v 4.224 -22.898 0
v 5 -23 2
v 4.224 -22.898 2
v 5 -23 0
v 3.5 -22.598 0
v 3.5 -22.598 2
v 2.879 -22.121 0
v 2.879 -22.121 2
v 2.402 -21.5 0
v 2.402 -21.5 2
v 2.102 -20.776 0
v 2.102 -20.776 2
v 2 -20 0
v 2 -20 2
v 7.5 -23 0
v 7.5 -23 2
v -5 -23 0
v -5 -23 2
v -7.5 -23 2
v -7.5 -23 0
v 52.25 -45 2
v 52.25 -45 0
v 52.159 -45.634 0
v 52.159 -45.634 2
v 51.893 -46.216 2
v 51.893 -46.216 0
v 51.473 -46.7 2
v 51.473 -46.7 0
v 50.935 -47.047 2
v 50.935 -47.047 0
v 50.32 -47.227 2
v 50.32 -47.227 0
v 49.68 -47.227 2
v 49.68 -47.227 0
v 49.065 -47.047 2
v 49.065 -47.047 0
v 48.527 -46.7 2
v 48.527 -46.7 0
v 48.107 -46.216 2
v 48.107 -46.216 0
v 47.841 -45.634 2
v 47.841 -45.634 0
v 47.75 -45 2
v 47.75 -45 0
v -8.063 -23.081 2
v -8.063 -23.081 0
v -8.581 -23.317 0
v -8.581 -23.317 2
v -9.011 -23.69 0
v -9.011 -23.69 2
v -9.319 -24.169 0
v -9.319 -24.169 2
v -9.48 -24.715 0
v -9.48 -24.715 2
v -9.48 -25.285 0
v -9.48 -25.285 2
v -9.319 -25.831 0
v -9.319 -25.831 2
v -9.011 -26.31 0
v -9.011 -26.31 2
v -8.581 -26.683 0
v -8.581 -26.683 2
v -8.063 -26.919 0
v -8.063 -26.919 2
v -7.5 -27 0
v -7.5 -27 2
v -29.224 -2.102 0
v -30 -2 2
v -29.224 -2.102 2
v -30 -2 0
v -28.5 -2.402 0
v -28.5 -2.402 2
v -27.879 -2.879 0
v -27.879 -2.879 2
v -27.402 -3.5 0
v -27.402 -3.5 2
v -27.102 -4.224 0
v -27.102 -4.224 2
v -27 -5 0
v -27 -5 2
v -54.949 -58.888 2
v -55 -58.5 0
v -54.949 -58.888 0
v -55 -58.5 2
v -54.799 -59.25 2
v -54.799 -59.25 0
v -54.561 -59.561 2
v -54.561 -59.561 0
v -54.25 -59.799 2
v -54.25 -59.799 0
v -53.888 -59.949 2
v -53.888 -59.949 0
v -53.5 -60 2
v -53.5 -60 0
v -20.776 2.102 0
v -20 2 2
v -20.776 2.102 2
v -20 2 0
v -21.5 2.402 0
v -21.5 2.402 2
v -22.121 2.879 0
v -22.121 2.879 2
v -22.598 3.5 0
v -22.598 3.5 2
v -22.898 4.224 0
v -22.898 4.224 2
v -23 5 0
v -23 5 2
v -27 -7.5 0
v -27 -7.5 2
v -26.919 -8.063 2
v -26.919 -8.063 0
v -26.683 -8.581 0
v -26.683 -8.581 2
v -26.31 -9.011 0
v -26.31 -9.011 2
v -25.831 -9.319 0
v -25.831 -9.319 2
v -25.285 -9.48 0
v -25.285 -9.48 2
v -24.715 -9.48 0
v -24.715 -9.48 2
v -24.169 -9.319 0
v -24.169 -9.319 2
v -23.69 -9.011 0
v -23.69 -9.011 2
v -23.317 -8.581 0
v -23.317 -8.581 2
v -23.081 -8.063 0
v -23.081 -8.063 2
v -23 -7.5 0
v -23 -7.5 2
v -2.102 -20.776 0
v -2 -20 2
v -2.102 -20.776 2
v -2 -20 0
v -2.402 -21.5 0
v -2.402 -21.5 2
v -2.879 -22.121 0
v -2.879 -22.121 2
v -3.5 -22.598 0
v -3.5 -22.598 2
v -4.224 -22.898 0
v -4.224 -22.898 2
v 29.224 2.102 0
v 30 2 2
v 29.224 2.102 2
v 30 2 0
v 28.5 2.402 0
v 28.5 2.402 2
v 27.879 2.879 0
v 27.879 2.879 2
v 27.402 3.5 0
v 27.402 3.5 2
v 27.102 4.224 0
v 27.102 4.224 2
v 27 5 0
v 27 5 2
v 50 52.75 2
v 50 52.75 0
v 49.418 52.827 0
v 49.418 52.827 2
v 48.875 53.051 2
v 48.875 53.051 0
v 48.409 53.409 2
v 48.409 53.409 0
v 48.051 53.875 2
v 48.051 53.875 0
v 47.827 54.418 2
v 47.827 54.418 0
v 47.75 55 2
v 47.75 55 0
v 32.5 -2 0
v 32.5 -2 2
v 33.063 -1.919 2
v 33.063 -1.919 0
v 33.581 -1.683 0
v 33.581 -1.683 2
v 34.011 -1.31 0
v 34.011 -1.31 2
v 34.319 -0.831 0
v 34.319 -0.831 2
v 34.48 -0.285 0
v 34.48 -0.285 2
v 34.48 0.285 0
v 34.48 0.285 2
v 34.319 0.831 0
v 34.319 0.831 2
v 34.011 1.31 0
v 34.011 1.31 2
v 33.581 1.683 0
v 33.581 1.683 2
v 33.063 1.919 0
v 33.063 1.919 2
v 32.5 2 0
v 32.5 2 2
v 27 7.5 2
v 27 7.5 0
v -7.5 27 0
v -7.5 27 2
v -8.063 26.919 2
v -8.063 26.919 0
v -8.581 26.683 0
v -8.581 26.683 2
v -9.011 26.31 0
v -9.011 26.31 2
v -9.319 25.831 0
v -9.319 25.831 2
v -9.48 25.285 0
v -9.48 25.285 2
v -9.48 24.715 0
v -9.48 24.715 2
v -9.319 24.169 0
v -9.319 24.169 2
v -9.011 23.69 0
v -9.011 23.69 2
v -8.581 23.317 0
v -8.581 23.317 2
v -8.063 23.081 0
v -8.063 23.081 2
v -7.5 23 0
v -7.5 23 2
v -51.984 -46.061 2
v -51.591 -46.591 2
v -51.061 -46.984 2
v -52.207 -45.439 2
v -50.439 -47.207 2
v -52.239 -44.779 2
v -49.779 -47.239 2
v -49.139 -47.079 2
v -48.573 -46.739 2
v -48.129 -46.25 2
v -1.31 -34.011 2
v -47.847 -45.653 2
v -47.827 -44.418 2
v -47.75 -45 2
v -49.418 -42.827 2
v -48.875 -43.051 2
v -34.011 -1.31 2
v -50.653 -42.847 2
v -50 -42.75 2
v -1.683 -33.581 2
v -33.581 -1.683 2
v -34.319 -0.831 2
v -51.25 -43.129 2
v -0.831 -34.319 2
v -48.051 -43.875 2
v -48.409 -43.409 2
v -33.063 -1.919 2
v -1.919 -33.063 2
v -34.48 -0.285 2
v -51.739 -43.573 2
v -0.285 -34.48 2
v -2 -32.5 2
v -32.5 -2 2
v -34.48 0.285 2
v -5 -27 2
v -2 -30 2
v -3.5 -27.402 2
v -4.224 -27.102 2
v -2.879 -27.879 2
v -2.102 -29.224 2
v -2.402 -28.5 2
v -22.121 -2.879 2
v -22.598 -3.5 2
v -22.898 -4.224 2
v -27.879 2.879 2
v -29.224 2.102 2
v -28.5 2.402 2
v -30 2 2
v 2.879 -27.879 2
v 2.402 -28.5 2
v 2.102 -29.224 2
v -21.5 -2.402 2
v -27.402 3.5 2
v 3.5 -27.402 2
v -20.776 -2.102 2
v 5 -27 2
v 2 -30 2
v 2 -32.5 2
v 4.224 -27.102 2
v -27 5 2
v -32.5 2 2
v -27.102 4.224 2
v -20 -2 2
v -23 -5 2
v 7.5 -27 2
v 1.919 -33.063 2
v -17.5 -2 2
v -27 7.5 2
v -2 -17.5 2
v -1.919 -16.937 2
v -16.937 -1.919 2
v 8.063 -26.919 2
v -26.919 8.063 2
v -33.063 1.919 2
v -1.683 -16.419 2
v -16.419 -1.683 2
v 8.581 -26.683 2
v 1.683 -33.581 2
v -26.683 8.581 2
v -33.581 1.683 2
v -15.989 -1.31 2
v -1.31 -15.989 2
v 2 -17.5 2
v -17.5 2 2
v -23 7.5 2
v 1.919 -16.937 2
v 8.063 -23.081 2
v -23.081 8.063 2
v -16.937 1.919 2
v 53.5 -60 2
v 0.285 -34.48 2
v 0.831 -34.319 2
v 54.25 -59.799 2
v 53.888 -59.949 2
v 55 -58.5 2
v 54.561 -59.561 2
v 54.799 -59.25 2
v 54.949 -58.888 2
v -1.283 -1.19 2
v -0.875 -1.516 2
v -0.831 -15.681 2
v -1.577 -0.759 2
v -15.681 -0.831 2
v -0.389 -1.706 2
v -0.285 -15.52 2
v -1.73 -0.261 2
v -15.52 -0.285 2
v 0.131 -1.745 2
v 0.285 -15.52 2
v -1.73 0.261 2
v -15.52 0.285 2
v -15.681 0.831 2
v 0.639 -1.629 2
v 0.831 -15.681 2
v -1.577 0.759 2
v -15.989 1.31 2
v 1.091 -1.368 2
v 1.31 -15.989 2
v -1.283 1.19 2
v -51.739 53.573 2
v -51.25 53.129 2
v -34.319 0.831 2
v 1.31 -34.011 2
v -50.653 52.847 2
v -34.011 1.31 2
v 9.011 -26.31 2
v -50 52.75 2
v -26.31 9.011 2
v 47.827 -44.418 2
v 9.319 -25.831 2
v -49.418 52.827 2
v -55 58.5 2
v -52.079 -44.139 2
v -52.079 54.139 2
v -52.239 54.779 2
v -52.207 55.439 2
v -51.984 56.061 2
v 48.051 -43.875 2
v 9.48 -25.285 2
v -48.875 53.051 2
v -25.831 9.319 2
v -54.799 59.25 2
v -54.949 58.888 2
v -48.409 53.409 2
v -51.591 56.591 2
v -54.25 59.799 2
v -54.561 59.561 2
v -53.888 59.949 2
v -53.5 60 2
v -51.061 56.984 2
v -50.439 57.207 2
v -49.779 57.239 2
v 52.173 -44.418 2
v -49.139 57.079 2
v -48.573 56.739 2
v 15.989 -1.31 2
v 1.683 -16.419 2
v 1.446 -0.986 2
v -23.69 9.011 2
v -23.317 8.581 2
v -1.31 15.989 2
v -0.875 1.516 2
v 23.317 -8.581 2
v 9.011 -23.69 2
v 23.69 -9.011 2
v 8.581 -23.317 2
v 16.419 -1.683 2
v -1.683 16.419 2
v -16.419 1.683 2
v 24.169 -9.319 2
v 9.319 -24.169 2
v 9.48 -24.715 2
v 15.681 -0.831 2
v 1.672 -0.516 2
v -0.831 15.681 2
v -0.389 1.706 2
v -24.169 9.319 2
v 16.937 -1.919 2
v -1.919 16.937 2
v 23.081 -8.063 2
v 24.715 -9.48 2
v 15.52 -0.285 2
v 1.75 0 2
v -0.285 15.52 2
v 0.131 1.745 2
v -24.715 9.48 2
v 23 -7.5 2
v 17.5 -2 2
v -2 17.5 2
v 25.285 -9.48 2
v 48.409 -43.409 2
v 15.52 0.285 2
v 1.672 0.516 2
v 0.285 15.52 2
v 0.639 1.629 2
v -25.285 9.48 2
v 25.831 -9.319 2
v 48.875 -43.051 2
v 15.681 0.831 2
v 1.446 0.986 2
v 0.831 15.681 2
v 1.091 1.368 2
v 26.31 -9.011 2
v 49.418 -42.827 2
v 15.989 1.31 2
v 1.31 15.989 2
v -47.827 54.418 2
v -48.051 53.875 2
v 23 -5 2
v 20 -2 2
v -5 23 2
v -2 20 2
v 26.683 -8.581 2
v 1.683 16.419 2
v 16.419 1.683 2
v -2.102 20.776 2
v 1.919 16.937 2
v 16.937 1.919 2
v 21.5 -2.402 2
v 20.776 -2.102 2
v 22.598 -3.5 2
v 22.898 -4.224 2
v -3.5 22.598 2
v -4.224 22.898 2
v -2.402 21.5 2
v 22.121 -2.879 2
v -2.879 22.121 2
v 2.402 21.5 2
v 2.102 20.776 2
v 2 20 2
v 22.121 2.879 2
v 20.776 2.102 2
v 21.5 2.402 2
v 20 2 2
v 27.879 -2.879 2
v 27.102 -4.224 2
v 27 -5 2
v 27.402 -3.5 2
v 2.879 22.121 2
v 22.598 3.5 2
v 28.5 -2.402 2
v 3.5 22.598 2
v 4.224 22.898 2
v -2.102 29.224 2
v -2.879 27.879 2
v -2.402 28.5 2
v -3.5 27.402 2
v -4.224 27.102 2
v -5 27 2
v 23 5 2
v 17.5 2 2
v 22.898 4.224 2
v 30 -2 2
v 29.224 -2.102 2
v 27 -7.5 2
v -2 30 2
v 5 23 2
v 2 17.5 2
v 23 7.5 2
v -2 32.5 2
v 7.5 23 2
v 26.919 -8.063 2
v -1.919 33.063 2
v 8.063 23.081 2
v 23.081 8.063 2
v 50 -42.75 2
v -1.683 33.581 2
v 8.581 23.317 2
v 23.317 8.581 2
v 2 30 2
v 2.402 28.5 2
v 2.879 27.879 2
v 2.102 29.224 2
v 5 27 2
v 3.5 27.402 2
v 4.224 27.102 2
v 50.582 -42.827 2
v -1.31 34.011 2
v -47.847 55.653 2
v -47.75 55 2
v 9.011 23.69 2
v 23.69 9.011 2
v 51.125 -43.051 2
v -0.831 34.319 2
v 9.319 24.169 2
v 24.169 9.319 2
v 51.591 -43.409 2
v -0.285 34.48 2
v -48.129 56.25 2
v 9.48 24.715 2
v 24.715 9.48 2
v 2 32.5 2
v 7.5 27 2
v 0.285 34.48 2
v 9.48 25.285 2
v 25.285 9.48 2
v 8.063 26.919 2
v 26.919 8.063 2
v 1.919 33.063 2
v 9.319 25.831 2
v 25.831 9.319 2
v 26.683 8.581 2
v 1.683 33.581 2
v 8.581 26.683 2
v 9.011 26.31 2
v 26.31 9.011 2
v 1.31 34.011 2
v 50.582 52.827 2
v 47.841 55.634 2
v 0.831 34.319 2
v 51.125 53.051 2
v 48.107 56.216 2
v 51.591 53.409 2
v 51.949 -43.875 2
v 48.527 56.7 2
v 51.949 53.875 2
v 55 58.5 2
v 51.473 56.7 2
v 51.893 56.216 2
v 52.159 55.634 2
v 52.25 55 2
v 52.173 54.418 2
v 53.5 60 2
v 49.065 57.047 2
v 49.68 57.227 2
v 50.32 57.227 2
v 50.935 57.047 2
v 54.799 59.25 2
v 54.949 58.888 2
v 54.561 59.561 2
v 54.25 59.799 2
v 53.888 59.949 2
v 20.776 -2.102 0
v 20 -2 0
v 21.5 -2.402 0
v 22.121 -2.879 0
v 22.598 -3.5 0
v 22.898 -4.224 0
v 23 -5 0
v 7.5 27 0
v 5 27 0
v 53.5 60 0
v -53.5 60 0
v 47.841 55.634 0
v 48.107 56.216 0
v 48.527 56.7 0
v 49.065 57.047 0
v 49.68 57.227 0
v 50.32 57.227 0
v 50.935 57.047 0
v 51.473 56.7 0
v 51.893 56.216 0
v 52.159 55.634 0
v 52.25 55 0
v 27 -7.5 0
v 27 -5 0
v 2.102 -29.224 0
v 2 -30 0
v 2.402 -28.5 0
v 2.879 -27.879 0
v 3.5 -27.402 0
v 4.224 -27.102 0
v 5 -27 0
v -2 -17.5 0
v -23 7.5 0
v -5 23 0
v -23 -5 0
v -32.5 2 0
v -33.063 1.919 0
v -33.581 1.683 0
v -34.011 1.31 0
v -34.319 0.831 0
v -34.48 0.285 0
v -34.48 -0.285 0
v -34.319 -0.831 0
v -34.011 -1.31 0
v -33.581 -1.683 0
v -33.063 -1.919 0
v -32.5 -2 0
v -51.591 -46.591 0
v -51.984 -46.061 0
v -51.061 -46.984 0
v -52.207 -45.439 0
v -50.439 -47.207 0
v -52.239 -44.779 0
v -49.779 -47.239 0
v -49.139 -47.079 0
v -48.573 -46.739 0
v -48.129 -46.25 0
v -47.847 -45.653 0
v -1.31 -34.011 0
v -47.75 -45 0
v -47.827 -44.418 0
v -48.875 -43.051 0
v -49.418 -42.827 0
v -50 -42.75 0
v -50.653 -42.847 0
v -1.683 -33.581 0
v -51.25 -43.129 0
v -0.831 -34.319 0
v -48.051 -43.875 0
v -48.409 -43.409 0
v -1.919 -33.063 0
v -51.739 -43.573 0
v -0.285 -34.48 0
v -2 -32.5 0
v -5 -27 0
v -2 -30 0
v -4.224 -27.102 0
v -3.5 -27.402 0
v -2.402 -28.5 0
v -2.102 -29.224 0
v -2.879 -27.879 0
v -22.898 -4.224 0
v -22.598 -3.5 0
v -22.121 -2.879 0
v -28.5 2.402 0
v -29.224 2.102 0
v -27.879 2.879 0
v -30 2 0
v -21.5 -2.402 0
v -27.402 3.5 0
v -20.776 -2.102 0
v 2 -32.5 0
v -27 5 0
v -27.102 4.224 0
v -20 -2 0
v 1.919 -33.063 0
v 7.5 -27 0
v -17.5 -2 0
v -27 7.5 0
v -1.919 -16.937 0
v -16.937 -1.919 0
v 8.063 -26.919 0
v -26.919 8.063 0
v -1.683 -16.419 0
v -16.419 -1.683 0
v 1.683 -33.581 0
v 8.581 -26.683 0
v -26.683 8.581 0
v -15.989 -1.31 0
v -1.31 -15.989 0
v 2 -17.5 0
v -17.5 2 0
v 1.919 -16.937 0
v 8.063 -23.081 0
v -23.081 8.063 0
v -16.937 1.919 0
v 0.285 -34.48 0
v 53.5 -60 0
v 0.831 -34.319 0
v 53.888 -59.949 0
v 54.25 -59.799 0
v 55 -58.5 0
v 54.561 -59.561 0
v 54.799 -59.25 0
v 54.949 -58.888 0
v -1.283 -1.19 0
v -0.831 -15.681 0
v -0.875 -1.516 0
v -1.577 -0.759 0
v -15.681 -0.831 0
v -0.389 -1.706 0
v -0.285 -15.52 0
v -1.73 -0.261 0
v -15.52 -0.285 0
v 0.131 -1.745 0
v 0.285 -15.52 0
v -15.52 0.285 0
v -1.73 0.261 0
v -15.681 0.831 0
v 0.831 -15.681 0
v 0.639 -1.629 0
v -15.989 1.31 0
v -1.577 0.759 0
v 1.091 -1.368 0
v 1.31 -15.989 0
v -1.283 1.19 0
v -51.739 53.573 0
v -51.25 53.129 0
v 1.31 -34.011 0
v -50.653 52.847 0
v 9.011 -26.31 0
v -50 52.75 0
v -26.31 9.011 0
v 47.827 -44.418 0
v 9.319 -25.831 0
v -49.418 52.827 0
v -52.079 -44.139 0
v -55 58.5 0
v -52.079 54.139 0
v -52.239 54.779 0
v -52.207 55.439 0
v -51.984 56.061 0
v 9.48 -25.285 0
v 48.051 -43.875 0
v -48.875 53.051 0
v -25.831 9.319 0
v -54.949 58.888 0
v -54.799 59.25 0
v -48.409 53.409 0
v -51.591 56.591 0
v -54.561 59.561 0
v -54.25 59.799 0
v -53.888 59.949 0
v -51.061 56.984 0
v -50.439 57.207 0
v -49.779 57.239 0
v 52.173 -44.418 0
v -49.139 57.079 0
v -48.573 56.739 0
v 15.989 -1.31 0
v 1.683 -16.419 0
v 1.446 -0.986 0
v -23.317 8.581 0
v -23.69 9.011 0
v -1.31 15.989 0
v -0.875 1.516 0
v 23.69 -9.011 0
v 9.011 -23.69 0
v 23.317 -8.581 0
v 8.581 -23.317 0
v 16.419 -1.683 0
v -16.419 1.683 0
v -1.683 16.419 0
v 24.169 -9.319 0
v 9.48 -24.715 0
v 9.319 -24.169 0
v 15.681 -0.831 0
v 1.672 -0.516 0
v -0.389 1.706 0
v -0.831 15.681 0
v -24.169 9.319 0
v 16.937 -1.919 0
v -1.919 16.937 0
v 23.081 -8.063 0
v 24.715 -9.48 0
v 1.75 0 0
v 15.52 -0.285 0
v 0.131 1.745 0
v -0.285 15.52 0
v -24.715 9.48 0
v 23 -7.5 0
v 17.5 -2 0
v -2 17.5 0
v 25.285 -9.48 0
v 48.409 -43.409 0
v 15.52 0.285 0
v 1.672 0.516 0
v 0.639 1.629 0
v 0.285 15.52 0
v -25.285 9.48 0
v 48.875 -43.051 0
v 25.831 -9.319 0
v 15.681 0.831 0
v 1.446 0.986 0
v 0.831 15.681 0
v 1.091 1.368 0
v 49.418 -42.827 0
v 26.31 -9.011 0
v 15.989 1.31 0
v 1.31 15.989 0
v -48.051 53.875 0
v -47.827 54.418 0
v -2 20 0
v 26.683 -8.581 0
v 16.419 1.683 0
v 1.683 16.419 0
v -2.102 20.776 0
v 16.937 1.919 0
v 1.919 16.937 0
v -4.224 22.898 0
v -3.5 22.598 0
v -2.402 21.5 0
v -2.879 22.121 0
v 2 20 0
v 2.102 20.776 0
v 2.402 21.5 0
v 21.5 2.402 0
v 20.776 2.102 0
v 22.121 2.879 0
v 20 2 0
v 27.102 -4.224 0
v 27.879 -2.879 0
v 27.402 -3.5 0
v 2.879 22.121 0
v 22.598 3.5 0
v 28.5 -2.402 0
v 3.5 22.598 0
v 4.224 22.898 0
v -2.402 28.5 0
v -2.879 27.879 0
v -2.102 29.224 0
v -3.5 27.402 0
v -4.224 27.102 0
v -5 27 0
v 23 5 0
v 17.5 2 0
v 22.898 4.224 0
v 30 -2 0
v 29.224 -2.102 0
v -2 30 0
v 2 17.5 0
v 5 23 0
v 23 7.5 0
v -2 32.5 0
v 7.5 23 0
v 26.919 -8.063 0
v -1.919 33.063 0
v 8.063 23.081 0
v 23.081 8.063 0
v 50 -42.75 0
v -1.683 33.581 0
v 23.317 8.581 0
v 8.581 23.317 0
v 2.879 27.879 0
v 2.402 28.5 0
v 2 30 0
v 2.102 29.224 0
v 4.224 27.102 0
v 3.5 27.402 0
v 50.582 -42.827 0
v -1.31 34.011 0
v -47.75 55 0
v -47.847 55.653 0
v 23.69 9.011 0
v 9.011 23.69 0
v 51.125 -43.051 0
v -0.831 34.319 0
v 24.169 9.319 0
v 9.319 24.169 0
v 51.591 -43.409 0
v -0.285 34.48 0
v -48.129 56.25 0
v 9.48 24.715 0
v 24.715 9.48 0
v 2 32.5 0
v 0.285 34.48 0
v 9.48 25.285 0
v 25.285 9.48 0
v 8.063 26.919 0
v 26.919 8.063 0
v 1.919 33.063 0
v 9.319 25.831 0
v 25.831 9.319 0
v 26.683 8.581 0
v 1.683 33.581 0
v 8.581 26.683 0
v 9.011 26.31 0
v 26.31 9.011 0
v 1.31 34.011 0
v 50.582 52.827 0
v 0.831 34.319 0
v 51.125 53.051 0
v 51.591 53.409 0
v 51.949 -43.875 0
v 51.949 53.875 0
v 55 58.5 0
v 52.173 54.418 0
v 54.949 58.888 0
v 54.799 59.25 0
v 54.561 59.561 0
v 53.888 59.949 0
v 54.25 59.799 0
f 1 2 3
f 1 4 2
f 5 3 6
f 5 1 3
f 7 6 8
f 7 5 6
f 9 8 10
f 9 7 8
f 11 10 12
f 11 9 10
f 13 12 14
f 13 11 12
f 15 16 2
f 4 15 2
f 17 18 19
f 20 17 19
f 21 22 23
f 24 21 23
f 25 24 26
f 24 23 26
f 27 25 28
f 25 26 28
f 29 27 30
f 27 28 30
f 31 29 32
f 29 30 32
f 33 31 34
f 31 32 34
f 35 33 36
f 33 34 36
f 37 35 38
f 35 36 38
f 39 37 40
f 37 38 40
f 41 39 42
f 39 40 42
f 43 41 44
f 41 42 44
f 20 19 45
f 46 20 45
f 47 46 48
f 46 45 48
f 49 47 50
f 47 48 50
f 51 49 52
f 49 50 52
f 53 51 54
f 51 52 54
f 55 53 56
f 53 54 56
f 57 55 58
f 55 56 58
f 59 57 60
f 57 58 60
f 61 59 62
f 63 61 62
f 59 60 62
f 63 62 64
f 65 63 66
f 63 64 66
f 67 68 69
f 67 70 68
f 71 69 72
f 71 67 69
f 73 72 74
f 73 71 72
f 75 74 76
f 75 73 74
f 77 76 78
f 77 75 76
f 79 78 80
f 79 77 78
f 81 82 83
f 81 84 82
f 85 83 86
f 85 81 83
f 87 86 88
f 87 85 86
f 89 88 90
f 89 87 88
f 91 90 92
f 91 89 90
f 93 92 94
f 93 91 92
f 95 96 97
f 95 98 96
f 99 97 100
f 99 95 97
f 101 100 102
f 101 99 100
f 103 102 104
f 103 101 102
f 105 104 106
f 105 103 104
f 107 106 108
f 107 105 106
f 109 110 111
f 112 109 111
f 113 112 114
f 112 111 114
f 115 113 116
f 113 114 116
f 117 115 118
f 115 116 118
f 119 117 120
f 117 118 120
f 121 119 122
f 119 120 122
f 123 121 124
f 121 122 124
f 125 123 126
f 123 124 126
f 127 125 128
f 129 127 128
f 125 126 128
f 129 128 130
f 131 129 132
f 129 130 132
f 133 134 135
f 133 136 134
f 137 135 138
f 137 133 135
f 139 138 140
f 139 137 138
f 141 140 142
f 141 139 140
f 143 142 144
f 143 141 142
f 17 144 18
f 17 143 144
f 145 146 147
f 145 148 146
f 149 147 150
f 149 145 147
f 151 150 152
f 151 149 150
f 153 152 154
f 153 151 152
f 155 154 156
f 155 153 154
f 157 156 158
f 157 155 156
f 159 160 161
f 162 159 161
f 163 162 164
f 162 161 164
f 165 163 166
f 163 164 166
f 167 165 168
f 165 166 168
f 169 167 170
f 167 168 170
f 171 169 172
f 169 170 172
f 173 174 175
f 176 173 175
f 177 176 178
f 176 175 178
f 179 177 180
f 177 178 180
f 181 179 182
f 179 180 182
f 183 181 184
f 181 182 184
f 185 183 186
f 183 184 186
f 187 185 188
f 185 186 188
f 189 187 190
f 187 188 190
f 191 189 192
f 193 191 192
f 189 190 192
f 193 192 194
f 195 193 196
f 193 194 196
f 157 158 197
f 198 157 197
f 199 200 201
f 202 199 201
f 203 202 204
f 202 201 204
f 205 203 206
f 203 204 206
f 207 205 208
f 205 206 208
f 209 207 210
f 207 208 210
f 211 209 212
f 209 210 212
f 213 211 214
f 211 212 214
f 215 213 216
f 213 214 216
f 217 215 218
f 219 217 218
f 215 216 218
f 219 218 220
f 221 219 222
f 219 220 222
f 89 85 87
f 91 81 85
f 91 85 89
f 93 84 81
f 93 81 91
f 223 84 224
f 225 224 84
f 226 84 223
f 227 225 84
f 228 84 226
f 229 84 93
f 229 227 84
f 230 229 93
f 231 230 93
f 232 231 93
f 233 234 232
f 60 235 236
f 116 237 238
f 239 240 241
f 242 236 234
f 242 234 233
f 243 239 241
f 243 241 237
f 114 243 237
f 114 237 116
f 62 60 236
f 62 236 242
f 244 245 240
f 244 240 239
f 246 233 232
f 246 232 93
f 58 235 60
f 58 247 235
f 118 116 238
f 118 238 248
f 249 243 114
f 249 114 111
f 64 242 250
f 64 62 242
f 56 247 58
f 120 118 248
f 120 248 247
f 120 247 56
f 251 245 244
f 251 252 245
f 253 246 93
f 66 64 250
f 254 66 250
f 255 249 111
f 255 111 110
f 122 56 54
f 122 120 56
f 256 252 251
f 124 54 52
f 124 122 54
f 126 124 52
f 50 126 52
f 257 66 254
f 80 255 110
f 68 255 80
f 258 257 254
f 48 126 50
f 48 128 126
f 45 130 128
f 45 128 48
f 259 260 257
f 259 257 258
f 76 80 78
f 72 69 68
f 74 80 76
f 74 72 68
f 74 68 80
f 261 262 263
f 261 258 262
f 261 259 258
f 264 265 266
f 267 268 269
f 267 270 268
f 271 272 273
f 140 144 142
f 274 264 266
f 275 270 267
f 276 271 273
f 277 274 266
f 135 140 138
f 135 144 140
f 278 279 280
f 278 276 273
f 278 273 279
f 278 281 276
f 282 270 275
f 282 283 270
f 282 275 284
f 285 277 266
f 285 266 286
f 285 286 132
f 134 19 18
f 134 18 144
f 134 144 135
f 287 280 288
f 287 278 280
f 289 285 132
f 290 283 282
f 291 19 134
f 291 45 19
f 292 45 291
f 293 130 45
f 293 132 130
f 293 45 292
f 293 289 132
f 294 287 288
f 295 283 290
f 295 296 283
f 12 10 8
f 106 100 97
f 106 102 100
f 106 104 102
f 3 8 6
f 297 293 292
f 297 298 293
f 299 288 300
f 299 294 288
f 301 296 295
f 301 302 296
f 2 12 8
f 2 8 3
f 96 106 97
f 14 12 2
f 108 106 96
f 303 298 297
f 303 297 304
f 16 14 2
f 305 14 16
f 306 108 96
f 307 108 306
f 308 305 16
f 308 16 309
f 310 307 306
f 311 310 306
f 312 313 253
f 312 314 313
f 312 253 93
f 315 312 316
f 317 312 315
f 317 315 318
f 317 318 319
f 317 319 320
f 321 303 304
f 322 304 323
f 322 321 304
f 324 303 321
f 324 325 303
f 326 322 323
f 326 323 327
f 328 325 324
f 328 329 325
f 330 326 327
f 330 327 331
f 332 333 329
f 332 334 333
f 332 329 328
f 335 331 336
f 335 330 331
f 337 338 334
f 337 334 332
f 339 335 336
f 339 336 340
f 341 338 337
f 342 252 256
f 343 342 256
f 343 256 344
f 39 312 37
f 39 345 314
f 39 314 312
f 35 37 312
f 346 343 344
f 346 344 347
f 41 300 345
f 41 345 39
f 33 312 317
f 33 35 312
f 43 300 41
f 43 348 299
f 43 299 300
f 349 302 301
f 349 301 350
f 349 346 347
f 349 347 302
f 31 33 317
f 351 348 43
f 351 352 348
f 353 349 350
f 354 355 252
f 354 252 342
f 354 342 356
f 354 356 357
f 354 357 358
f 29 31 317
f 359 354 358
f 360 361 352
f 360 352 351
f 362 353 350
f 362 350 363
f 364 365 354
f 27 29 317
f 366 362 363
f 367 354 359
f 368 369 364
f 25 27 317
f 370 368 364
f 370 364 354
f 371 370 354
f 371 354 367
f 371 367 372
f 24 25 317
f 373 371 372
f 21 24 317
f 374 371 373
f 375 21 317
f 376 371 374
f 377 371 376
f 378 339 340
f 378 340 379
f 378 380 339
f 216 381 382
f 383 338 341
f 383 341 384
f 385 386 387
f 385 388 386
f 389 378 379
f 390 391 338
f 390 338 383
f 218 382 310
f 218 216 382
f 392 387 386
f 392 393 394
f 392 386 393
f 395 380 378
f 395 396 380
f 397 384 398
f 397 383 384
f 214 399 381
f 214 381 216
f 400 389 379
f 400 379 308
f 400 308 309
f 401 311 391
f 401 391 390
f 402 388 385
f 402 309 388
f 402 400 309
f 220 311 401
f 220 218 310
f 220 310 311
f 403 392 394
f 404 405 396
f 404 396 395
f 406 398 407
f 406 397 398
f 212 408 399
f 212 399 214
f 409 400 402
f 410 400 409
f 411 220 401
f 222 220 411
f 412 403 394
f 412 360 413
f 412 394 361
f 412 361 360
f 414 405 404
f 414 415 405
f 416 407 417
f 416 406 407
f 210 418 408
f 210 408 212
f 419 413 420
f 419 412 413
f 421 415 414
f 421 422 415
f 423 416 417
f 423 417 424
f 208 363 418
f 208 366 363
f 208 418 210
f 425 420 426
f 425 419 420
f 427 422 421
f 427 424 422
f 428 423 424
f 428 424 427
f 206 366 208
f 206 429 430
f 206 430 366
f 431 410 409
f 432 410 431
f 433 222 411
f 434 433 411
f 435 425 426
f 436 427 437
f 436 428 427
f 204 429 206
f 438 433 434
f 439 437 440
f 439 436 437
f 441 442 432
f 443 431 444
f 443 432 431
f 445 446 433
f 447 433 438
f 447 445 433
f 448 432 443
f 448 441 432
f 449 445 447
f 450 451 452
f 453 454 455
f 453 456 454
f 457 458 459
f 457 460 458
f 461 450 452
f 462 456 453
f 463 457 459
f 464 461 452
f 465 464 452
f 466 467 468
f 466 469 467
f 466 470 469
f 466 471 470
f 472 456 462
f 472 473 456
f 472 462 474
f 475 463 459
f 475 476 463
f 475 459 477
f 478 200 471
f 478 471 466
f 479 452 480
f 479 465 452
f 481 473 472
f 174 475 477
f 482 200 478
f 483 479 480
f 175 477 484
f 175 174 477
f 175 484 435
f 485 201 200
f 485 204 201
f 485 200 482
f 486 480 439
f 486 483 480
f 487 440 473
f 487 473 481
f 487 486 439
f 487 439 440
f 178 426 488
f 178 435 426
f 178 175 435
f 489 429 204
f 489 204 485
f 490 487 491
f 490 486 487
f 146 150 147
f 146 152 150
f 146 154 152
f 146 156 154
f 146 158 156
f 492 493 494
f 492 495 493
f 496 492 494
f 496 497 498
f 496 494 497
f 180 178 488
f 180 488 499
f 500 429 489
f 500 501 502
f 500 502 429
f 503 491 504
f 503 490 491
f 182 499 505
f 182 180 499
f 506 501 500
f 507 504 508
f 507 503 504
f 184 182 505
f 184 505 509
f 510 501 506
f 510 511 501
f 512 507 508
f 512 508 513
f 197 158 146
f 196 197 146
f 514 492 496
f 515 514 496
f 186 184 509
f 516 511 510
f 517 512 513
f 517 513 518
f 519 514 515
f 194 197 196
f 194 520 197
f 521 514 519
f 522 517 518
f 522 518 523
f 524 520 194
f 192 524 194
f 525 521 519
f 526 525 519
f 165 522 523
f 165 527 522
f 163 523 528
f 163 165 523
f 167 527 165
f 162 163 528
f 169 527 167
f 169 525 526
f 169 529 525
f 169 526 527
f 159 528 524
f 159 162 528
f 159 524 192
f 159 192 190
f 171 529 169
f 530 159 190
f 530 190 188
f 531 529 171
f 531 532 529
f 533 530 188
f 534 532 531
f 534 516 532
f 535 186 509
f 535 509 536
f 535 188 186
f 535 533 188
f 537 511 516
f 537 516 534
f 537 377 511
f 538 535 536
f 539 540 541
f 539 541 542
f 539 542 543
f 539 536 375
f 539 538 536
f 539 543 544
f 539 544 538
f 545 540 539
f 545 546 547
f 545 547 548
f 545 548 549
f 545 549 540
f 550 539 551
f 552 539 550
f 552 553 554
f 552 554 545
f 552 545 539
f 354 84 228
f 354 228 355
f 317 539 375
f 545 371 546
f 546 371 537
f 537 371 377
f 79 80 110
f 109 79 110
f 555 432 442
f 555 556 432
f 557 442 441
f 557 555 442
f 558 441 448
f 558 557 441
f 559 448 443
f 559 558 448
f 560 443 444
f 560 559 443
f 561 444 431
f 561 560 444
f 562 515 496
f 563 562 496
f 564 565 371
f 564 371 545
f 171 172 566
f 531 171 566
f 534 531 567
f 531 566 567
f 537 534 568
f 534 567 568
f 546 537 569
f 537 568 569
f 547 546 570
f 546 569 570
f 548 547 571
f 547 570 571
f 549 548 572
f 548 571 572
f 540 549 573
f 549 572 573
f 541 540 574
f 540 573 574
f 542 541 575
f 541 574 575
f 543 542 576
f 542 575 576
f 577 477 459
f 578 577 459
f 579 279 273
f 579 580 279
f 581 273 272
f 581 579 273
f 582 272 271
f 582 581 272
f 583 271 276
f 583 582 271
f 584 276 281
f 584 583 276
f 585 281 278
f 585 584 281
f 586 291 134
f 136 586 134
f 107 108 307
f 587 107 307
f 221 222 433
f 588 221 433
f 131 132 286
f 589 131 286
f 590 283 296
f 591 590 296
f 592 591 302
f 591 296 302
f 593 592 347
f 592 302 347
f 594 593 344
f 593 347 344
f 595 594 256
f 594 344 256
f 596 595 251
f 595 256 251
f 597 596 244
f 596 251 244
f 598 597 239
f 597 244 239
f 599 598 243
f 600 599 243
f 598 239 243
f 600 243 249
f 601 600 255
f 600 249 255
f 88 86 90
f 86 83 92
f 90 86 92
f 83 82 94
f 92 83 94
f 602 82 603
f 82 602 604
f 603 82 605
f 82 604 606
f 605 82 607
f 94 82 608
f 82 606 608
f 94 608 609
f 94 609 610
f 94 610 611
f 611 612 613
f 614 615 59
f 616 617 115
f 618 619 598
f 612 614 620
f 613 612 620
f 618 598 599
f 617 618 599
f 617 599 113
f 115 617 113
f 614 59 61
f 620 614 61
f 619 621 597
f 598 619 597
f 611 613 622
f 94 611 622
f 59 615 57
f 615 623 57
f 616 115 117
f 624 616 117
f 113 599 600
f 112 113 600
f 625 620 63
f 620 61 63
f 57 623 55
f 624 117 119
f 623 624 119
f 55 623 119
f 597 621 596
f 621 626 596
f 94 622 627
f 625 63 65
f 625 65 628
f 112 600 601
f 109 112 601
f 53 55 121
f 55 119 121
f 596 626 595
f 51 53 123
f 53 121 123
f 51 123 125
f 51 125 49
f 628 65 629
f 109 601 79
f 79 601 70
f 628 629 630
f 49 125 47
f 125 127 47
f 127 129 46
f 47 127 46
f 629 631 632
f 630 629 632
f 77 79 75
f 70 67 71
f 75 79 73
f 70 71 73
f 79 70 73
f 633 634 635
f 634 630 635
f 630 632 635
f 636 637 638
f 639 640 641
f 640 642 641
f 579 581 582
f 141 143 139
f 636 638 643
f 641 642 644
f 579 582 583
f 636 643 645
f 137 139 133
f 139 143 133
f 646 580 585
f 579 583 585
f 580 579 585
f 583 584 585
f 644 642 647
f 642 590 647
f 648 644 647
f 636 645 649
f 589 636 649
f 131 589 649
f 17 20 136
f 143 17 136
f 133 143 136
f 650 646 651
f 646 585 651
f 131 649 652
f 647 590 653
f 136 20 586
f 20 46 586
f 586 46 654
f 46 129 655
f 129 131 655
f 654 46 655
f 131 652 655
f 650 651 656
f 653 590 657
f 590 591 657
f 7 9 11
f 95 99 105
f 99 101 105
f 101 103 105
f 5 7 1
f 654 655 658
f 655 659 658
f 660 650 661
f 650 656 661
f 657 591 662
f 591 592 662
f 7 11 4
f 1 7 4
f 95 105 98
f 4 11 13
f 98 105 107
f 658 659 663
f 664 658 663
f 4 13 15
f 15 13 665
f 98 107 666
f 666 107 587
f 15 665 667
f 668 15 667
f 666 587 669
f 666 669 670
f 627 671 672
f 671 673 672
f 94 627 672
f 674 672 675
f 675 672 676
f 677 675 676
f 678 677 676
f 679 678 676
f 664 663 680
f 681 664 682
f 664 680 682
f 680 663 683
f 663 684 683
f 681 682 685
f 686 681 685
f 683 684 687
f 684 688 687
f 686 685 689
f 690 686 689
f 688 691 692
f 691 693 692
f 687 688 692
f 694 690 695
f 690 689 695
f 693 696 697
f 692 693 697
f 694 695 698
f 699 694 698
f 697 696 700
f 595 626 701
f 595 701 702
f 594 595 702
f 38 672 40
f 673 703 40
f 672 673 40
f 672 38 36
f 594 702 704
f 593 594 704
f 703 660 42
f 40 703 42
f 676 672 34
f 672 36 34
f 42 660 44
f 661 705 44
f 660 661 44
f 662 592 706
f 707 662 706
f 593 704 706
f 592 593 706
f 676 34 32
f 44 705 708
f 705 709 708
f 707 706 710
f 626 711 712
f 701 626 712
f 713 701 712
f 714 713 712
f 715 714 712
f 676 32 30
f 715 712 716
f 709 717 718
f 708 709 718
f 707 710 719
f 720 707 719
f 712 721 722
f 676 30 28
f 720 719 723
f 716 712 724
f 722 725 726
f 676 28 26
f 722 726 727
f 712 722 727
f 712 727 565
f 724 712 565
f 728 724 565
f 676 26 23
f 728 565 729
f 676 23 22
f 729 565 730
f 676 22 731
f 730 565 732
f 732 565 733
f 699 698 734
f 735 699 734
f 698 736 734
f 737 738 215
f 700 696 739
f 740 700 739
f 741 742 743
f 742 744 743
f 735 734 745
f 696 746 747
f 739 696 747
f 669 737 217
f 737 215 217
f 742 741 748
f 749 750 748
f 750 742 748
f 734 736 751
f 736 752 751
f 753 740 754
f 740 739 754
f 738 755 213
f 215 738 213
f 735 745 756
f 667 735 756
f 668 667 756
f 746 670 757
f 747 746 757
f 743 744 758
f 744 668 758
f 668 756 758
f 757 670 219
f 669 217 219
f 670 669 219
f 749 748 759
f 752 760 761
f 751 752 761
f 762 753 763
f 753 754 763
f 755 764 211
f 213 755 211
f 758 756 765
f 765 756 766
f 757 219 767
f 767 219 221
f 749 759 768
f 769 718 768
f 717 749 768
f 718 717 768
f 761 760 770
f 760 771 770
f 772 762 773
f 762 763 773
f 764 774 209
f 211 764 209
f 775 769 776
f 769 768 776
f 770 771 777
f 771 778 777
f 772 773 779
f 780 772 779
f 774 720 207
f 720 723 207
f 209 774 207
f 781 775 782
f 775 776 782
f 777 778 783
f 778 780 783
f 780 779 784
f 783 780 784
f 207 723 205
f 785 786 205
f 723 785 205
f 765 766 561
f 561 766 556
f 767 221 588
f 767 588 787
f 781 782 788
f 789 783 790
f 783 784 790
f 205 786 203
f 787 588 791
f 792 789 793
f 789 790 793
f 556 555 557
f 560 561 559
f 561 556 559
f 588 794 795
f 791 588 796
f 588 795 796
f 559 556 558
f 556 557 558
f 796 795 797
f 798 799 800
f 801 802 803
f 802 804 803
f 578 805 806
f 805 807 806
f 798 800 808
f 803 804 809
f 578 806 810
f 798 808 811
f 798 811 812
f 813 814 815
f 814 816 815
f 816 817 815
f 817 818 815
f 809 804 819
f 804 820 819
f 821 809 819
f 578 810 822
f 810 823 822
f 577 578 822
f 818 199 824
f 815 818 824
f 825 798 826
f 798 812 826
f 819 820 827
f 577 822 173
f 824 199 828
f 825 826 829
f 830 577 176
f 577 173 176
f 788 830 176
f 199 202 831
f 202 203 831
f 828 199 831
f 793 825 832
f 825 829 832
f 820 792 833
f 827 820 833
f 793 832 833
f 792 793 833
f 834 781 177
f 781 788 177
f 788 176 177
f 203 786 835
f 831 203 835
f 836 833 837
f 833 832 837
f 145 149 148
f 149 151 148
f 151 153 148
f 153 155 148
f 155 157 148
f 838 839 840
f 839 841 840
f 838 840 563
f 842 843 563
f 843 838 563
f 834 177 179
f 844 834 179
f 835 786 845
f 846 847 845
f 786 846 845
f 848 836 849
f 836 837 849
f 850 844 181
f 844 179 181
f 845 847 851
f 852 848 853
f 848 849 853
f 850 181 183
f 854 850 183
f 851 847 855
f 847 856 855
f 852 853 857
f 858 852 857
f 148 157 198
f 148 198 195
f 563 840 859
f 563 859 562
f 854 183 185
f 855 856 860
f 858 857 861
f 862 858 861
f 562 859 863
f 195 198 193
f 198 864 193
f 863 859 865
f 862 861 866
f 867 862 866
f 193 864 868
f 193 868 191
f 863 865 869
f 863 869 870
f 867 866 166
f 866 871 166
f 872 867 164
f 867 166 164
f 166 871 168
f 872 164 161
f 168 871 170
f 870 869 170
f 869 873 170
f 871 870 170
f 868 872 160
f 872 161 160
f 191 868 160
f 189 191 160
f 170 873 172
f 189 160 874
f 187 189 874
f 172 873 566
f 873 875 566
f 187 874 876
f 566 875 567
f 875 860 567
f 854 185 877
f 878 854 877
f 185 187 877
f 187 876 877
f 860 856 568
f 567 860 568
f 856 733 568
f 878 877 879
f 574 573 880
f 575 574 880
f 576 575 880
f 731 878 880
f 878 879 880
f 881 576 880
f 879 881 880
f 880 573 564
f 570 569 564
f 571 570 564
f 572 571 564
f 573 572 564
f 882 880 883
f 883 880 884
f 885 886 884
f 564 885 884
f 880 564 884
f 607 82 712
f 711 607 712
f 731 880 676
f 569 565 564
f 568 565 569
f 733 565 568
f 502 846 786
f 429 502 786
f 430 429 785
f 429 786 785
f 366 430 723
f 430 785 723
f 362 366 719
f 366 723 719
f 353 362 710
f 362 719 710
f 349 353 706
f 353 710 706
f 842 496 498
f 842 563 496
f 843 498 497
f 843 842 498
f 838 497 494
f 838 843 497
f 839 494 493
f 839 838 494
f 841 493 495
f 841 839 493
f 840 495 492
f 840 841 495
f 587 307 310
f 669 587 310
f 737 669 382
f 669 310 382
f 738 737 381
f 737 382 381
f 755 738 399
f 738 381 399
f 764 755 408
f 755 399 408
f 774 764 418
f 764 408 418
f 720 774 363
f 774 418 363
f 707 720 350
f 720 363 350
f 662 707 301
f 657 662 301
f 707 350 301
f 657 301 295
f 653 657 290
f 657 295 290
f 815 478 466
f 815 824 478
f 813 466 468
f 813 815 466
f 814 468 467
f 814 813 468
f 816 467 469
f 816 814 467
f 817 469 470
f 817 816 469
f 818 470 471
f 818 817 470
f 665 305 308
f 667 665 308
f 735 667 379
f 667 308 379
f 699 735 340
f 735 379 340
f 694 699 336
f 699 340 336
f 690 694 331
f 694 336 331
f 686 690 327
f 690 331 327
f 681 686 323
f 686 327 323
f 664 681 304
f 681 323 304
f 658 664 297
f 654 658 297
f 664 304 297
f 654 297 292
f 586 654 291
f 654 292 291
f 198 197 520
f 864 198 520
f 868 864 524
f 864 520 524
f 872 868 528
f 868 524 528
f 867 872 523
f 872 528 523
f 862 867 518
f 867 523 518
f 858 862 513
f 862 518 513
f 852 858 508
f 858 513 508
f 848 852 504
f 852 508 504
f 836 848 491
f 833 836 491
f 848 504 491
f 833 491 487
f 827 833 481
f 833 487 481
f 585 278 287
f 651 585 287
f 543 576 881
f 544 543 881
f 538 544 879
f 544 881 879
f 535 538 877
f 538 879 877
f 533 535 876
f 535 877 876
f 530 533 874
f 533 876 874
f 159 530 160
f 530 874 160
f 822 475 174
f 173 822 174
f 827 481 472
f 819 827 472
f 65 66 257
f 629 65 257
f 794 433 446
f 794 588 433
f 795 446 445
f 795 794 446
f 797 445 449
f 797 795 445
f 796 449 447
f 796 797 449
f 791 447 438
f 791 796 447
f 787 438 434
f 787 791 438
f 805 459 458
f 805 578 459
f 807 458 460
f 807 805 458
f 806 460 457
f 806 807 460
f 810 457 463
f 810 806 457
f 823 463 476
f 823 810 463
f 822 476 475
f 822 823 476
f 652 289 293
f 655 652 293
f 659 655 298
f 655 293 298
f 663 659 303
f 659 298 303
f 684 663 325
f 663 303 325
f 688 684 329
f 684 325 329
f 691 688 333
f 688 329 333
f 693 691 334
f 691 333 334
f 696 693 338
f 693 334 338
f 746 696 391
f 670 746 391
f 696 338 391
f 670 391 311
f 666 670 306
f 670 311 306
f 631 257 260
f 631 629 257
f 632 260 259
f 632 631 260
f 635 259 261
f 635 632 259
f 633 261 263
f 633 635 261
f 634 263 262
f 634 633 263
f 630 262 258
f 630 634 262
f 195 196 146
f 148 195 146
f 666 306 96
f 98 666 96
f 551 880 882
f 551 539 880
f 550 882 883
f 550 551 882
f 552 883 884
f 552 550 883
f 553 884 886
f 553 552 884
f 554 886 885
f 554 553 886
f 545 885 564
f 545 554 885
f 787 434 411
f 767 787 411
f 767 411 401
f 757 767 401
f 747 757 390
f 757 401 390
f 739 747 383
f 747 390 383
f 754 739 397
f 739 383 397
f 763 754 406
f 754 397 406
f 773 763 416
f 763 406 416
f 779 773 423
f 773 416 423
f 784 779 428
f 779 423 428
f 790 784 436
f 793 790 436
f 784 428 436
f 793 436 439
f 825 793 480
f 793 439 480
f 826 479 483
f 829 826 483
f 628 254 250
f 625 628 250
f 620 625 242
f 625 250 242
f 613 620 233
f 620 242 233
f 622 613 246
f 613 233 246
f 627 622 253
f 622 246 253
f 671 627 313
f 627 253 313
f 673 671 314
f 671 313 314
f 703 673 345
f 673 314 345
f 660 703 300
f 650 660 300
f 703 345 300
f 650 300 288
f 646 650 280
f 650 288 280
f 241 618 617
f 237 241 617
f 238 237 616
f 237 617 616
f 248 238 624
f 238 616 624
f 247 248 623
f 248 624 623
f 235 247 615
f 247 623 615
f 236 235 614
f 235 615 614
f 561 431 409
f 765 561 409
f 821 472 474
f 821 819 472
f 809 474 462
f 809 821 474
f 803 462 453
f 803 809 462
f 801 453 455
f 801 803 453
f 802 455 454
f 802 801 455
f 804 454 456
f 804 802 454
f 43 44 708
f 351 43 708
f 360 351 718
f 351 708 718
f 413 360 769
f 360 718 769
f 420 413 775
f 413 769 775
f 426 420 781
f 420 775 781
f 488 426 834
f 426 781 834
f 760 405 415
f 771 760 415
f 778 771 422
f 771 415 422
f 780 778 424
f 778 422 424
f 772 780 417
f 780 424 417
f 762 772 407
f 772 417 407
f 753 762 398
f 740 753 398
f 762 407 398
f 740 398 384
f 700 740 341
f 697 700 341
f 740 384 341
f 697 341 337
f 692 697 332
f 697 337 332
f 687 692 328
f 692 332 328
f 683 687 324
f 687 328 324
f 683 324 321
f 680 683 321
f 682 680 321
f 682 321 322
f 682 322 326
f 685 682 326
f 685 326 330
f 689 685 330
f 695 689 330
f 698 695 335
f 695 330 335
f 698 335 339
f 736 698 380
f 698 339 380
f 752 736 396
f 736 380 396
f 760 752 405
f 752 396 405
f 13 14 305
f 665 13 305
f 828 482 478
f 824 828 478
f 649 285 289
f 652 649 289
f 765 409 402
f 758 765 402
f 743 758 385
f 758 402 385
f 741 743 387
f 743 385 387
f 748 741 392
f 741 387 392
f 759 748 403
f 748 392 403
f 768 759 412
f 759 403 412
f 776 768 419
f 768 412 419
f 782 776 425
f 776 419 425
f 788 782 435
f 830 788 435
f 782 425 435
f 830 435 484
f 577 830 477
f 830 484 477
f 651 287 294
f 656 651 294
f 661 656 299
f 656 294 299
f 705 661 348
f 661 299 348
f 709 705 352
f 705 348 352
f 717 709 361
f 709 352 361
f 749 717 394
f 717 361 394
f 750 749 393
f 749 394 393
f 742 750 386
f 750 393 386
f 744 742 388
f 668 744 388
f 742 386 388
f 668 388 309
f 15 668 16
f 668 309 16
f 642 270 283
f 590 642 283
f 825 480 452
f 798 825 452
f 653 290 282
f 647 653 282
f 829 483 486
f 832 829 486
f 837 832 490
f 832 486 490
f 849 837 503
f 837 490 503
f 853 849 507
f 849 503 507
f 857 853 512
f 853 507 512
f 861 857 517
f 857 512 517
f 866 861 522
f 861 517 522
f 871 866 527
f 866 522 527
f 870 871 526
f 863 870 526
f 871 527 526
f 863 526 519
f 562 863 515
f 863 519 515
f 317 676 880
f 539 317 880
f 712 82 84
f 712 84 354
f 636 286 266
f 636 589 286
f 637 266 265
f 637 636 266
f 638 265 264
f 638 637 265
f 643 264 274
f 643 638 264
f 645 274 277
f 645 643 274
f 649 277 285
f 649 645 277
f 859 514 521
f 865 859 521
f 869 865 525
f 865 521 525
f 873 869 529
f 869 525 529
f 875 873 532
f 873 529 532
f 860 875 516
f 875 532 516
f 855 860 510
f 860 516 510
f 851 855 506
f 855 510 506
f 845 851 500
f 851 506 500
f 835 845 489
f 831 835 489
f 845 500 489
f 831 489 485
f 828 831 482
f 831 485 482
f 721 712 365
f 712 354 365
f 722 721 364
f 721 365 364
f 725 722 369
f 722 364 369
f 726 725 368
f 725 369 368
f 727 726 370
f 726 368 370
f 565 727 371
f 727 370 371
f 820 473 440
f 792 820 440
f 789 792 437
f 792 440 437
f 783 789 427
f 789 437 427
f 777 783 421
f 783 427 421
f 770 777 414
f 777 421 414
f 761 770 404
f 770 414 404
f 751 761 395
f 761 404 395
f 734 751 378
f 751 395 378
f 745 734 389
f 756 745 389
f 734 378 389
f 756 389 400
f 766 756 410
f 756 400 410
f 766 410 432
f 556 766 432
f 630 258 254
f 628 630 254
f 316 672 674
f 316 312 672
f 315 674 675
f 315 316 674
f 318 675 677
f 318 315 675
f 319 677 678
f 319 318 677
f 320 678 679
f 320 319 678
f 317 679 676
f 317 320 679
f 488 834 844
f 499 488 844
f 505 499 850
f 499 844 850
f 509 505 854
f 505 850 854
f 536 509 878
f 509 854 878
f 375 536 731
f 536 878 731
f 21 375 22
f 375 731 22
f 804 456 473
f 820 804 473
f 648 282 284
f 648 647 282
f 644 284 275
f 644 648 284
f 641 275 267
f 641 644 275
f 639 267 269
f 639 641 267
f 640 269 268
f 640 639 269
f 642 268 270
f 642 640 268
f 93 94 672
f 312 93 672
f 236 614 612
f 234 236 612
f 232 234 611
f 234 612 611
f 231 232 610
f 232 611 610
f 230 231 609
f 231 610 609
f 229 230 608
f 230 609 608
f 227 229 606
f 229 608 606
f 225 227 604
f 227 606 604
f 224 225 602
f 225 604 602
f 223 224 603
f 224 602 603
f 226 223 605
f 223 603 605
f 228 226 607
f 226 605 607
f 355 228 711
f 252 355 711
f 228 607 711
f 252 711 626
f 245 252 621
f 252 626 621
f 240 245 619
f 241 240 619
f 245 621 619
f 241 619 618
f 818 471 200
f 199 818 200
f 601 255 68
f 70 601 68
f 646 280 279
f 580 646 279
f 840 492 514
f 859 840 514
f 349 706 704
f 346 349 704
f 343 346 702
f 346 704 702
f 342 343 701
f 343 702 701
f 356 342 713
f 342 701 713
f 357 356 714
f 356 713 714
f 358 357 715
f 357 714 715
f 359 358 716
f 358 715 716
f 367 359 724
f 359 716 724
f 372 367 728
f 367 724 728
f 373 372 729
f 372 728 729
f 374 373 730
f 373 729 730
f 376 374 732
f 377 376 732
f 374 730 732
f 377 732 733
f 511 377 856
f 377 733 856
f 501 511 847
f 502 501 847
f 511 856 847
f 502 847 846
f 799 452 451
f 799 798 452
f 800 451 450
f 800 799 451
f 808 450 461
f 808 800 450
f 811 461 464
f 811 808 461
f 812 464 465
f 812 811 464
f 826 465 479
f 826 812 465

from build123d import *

# Parameters (mm, degrees)
F0_W     = 110
F0_H     = 120
F1_DEPTH = 2
F2_R     = 1.5
F3_W     = 2
F3_H     = 2
F3_R     = 1.75
F4_DEPTH = 2
F5_R     = 3


with BuildPart() as f1:
    # F0 (on Top) → F1 (new body)
    with BuildSketch(Plane.XY):
        Rectangle(F0_W, F0_H)
        with BuildLine():
            ThreePointArc((-50, 52.75), (-51.5909902577, 56.5909902577), (-47.75, 55))
            Line((-47.75, 55), (47.75, 55))
            ThreePointArc((47.75, 55), (50, 57.25), (52.25, 55))
            ThreePointArc((52.25, 55), (51.5909902577, 53.4090097423), (50, 52.75))
            Line((50, 52.75), (50, -42.75))
            ThreePointArc((50, -42.75), (51.5909902577, -43.4090097423), (52.25, -45))
            ThreePointArc((52.25, -45), (50, -47.25), (47.75, -45))
            Line((47.75, -45), (-47.75, -45))
            ThreePointArc((-47.75, -45), (-51.5909902577, -46.5909902577), (-50, -42.75))
            Line((-50, -42.75), (-50, 52.75))
        make_face(mode=Mode.SUBTRACT)
        with BuildLine():
            Line((47.75, 55), (-47.75, 55))
            ThreePointArc((-47.75, 55), (-48.4090097423, 53.4090097423), (-50, 52.75))
            Line((-50, 52.75), (-50, -42.75))
            ThreePointArc((-50, -42.75), (-48.4090097423, -43.4090097423), (-47.75, -45))
            Line((-47.75, -45), (47.75, -45))
            ThreePointArc((47.75, -45), (48.4090097423, -43.4090097423), (50, -42.75))
            Line((50, -42.75), (50, 52.75))
            ThreePointArc((50, 52.75), (48.4090097423, 53.4090097423), (47.75, 55))
        make_face()
    extrude(amount=F1_DEPTH)

    # F2
    f2_edges = [f1.edges().sort_by_distance(p)[0] for p in [
        (55, 60, 1),
        (55, -60, 1),
        (-55, -60, 1),
        (-55, 60, 1),
    ]]
    fillet(f2_edges, radius=F2_R)

    # F3 (on face) → F4 (cut)
    with BuildSketch(Plane.XY.offset(2)):
        with Locations((-24, 1)):
            Rectangle(F3_W, F3_H)
        with Locations((-26, 1)):
            Rectangle(F3_W, F3_H)
        with BuildLine():
            Line((-27, 2), (-25, 2))
            Line((-25, 2), (-23, 2))
            Line((-23, 2), (-23, 7.5))
            ThreePointArc((-23, 7.5), (-25, 9.5), (-27, 7.5))
            Line((-27, 7.5), (-27, 2))
        make_face()
        with Locations((-24, -1)):
            Rectangle(F3_W, F3_H)
        with Locations((-26, -1)):
            Rectangle(F3_W, F3_H)
        with BuildLine():
            Line((-27, 0), (-27, 2))
            Line((-27, 2), (-32.5, 2))
            ThreePointArc((-32.5, 2), (-34.5, 0), (-32.5, -2))
            Line((-32.5, -2), (-27, -2))
            Line((-27, -2), (-27, 0))
        make_face()
        with BuildLine():
            Line((-17.5, 2), (-23, 2))
            Line((-23, 2), (-23, 0))
            Line((-23, 0), (-23, -2))
            Line((-23, -2), (-17.5, -2))
            ThreePointArc((-17.5, -2), (-15.5, 0), (-17.5, 2))
        make_face()
        with BuildLine():
            Line((-23, -2), (-25, -2))
            Line((-25, -2), (-27, -2))
            Line((-27, -2), (-27, -7.5))
            ThreePointArc((-27, -7.5), (-25, -9.5), (-23, -7.5))
            Line((-23, -7.5), (-23, -2))
        make_face()
        Circle(F3_R)
        with BuildLine():
            Line((23, 2), (17.5, 2))
            ThreePointArc((17.5, 2), (15.5, 0), (17.5, -2))
            Line((17.5, -2), (23, -2))
            Line((23, -2), (23, 0))
            Line((23, 0), (23, 2))
        make_face()
        with BuildLine():
            Line((23, 7.5), (23, 2))
            Line((23, 2), (25, 2))
            Line((25, 2), (27, 2))
            Line((27, 2), (27, 7.5))
            ThreePointArc((27, 7.5), (25, 9.5), (23, 7.5))
        make_face()
        with Locations((24, 1)):
            Rectangle(F3_W, F3_H)
        with Locations((26, 1)):
            Rectangle(F3_W, F3_H)
        with Locations((24, -1)):
            Rectangle(F3_W, F3_H)
        with BuildLine():
            Line((25, -2), (23, -2))
            Line((23, -2), (23, -7.5))
            ThreePointArc((23, -7.5), (25, -9.5), (27, -7.5))
            Line((27, -7.5), (27, -2))
            Line((27, -2), (25, -2))
        make_face()
        with BuildLine():
            Line((32.5, 2), (27, 2))
            Line((27, 2), (27, 0))
            Line((27, 0), (27, -2))
            Line((27, -2), (32.5, -2))
            ThreePointArc((32.5, -2), (34.5, 0), (32.5, 2))
        make_face()
        with Locations((26, -1)):
            Rectangle(F3_W, F3_H)
        with Locations((1, 26)):
            Rectangle(F3_W, F3_H)
        with Locations((-1, 26)):
            Rectangle(F3_W, F3_H)
        with BuildLine():
            Line((-2, 27), (0, 27))
            Line((0, 27), (2, 27))
            Line((2, 27), (2, 32.5))
            ThreePointArc((2, 32.5), (0, 34.5), (-2, 32.5))
            Line((-2, 32.5), (-2, 27))
        make_face()
        with Locations((1, 24)):
            Rectangle(F3_W, F3_H)
        with Locations((-1, 24)):
            Rectangle(F3_W, F3_H)
        with BuildLine():
            Line((-2, 25), (-2, 27))
            Line((-2, 27), (-7.5, 27))
            ThreePointArc((-7.5, 27), (-9.5, 25), (-7.5, 23))
            Line((-7.5, 23), (-2, 23))
            Line((-2, 23), (-2, 25))
        make_face()
        with BuildLine():
            Line((7.5, 27), (2, 27))
            Line((2, 27), (2, 25))
            Line((2, 25), (2, 23))
            Line((2, 23), (7.5, 23))
            ThreePointArc((7.5, 23), (9.5, 25), (7.5, 27))
        make_face()
        with BuildLine():
            Line((2, 23), (0, 23))
            Line((0, 23), (-2, 23))
            Line((-2, 23), (-2, 17.5))
            ThreePointArc((-2, 17.5), (0, 15.5), (2, 17.5))
            Line((2, 17.5), (2, 23))
        make_face()
        with BuildLine():
            ThreePointArc((-2, -32.5), (0, -34.5), (2, -32.5))
            Line((2, -32.5), (2, -27))
            Line((2, -27), (0, -27))
            Line((0, -27), (-2, -27))
            Line((-2, -27), (-2, -32.5))
        make_face()
        with Locations((1, -26)):
            Rectangle(F3_W, F3_H)
        with BuildLine():
            Line((2, -25), (2, -27))
            Line((2, -27), (7.5, -27))
            ThreePointArc((7.5, -27), (9.5, -25), (7.5, -23))
            Line((7.5, -23), (2, -23))
            Line((2, -23), (2, -25))
        make_face()
        with Locations((-1, -26)):
            Rectangle(F3_W, F3_H)
        with BuildLine():
            Line((-7.5, -27), (-2, -27))
            Line((-2, -27), (-2, -25))
            Line((-2, -25), (-2, -23))
            Line((-2, -23), (-7.5, -23))
            ThreePointArc((-7.5, -23), (-9.5, -25), (-7.5, -27))
        make_face()
        with Locations((1, -24)):
            Rectangle(F3_W, F3_H)
        with Locations((-1, -24)):
            Rectangle(F3_W, F3_H)
        with BuildLine():
            Line((0, -23), (2, -23))
            Line((2, -23), (2, -17.5))
            ThreePointArc((2, -17.5), (0, -15.5), (-2, -17.5))
            Line((-2, -17.5), (-2, -23))
            Line((-2, -23), (0, -23))
        make_face()
    extrude(amount=-F4_DEPTH, mode=Mode.SUBTRACT)

    # F5
    f5_edges = [f1.edges().sort_by_distance(p)[0] for p in [
        (-23, -2, 1),
        (-23, 2, 1),
        (-27, -2, 1),
        (-27, 2, 1),
        (23, 2, 1),
        (23, -2, 1),
        (27, 2, 1),
        (27, -2, 1),
        (-2, 27, 1),
        (2, 27, 1),
        (2, 23, 1),
        (-2, 23, 1),
        (-2, -23, 1),
        (-2, -27, 1),
        (2, -27, 1),
        (2, -23, 1),
    ]]
    fillet(f5_edges, radius=F5_R)


solid = f1.part
